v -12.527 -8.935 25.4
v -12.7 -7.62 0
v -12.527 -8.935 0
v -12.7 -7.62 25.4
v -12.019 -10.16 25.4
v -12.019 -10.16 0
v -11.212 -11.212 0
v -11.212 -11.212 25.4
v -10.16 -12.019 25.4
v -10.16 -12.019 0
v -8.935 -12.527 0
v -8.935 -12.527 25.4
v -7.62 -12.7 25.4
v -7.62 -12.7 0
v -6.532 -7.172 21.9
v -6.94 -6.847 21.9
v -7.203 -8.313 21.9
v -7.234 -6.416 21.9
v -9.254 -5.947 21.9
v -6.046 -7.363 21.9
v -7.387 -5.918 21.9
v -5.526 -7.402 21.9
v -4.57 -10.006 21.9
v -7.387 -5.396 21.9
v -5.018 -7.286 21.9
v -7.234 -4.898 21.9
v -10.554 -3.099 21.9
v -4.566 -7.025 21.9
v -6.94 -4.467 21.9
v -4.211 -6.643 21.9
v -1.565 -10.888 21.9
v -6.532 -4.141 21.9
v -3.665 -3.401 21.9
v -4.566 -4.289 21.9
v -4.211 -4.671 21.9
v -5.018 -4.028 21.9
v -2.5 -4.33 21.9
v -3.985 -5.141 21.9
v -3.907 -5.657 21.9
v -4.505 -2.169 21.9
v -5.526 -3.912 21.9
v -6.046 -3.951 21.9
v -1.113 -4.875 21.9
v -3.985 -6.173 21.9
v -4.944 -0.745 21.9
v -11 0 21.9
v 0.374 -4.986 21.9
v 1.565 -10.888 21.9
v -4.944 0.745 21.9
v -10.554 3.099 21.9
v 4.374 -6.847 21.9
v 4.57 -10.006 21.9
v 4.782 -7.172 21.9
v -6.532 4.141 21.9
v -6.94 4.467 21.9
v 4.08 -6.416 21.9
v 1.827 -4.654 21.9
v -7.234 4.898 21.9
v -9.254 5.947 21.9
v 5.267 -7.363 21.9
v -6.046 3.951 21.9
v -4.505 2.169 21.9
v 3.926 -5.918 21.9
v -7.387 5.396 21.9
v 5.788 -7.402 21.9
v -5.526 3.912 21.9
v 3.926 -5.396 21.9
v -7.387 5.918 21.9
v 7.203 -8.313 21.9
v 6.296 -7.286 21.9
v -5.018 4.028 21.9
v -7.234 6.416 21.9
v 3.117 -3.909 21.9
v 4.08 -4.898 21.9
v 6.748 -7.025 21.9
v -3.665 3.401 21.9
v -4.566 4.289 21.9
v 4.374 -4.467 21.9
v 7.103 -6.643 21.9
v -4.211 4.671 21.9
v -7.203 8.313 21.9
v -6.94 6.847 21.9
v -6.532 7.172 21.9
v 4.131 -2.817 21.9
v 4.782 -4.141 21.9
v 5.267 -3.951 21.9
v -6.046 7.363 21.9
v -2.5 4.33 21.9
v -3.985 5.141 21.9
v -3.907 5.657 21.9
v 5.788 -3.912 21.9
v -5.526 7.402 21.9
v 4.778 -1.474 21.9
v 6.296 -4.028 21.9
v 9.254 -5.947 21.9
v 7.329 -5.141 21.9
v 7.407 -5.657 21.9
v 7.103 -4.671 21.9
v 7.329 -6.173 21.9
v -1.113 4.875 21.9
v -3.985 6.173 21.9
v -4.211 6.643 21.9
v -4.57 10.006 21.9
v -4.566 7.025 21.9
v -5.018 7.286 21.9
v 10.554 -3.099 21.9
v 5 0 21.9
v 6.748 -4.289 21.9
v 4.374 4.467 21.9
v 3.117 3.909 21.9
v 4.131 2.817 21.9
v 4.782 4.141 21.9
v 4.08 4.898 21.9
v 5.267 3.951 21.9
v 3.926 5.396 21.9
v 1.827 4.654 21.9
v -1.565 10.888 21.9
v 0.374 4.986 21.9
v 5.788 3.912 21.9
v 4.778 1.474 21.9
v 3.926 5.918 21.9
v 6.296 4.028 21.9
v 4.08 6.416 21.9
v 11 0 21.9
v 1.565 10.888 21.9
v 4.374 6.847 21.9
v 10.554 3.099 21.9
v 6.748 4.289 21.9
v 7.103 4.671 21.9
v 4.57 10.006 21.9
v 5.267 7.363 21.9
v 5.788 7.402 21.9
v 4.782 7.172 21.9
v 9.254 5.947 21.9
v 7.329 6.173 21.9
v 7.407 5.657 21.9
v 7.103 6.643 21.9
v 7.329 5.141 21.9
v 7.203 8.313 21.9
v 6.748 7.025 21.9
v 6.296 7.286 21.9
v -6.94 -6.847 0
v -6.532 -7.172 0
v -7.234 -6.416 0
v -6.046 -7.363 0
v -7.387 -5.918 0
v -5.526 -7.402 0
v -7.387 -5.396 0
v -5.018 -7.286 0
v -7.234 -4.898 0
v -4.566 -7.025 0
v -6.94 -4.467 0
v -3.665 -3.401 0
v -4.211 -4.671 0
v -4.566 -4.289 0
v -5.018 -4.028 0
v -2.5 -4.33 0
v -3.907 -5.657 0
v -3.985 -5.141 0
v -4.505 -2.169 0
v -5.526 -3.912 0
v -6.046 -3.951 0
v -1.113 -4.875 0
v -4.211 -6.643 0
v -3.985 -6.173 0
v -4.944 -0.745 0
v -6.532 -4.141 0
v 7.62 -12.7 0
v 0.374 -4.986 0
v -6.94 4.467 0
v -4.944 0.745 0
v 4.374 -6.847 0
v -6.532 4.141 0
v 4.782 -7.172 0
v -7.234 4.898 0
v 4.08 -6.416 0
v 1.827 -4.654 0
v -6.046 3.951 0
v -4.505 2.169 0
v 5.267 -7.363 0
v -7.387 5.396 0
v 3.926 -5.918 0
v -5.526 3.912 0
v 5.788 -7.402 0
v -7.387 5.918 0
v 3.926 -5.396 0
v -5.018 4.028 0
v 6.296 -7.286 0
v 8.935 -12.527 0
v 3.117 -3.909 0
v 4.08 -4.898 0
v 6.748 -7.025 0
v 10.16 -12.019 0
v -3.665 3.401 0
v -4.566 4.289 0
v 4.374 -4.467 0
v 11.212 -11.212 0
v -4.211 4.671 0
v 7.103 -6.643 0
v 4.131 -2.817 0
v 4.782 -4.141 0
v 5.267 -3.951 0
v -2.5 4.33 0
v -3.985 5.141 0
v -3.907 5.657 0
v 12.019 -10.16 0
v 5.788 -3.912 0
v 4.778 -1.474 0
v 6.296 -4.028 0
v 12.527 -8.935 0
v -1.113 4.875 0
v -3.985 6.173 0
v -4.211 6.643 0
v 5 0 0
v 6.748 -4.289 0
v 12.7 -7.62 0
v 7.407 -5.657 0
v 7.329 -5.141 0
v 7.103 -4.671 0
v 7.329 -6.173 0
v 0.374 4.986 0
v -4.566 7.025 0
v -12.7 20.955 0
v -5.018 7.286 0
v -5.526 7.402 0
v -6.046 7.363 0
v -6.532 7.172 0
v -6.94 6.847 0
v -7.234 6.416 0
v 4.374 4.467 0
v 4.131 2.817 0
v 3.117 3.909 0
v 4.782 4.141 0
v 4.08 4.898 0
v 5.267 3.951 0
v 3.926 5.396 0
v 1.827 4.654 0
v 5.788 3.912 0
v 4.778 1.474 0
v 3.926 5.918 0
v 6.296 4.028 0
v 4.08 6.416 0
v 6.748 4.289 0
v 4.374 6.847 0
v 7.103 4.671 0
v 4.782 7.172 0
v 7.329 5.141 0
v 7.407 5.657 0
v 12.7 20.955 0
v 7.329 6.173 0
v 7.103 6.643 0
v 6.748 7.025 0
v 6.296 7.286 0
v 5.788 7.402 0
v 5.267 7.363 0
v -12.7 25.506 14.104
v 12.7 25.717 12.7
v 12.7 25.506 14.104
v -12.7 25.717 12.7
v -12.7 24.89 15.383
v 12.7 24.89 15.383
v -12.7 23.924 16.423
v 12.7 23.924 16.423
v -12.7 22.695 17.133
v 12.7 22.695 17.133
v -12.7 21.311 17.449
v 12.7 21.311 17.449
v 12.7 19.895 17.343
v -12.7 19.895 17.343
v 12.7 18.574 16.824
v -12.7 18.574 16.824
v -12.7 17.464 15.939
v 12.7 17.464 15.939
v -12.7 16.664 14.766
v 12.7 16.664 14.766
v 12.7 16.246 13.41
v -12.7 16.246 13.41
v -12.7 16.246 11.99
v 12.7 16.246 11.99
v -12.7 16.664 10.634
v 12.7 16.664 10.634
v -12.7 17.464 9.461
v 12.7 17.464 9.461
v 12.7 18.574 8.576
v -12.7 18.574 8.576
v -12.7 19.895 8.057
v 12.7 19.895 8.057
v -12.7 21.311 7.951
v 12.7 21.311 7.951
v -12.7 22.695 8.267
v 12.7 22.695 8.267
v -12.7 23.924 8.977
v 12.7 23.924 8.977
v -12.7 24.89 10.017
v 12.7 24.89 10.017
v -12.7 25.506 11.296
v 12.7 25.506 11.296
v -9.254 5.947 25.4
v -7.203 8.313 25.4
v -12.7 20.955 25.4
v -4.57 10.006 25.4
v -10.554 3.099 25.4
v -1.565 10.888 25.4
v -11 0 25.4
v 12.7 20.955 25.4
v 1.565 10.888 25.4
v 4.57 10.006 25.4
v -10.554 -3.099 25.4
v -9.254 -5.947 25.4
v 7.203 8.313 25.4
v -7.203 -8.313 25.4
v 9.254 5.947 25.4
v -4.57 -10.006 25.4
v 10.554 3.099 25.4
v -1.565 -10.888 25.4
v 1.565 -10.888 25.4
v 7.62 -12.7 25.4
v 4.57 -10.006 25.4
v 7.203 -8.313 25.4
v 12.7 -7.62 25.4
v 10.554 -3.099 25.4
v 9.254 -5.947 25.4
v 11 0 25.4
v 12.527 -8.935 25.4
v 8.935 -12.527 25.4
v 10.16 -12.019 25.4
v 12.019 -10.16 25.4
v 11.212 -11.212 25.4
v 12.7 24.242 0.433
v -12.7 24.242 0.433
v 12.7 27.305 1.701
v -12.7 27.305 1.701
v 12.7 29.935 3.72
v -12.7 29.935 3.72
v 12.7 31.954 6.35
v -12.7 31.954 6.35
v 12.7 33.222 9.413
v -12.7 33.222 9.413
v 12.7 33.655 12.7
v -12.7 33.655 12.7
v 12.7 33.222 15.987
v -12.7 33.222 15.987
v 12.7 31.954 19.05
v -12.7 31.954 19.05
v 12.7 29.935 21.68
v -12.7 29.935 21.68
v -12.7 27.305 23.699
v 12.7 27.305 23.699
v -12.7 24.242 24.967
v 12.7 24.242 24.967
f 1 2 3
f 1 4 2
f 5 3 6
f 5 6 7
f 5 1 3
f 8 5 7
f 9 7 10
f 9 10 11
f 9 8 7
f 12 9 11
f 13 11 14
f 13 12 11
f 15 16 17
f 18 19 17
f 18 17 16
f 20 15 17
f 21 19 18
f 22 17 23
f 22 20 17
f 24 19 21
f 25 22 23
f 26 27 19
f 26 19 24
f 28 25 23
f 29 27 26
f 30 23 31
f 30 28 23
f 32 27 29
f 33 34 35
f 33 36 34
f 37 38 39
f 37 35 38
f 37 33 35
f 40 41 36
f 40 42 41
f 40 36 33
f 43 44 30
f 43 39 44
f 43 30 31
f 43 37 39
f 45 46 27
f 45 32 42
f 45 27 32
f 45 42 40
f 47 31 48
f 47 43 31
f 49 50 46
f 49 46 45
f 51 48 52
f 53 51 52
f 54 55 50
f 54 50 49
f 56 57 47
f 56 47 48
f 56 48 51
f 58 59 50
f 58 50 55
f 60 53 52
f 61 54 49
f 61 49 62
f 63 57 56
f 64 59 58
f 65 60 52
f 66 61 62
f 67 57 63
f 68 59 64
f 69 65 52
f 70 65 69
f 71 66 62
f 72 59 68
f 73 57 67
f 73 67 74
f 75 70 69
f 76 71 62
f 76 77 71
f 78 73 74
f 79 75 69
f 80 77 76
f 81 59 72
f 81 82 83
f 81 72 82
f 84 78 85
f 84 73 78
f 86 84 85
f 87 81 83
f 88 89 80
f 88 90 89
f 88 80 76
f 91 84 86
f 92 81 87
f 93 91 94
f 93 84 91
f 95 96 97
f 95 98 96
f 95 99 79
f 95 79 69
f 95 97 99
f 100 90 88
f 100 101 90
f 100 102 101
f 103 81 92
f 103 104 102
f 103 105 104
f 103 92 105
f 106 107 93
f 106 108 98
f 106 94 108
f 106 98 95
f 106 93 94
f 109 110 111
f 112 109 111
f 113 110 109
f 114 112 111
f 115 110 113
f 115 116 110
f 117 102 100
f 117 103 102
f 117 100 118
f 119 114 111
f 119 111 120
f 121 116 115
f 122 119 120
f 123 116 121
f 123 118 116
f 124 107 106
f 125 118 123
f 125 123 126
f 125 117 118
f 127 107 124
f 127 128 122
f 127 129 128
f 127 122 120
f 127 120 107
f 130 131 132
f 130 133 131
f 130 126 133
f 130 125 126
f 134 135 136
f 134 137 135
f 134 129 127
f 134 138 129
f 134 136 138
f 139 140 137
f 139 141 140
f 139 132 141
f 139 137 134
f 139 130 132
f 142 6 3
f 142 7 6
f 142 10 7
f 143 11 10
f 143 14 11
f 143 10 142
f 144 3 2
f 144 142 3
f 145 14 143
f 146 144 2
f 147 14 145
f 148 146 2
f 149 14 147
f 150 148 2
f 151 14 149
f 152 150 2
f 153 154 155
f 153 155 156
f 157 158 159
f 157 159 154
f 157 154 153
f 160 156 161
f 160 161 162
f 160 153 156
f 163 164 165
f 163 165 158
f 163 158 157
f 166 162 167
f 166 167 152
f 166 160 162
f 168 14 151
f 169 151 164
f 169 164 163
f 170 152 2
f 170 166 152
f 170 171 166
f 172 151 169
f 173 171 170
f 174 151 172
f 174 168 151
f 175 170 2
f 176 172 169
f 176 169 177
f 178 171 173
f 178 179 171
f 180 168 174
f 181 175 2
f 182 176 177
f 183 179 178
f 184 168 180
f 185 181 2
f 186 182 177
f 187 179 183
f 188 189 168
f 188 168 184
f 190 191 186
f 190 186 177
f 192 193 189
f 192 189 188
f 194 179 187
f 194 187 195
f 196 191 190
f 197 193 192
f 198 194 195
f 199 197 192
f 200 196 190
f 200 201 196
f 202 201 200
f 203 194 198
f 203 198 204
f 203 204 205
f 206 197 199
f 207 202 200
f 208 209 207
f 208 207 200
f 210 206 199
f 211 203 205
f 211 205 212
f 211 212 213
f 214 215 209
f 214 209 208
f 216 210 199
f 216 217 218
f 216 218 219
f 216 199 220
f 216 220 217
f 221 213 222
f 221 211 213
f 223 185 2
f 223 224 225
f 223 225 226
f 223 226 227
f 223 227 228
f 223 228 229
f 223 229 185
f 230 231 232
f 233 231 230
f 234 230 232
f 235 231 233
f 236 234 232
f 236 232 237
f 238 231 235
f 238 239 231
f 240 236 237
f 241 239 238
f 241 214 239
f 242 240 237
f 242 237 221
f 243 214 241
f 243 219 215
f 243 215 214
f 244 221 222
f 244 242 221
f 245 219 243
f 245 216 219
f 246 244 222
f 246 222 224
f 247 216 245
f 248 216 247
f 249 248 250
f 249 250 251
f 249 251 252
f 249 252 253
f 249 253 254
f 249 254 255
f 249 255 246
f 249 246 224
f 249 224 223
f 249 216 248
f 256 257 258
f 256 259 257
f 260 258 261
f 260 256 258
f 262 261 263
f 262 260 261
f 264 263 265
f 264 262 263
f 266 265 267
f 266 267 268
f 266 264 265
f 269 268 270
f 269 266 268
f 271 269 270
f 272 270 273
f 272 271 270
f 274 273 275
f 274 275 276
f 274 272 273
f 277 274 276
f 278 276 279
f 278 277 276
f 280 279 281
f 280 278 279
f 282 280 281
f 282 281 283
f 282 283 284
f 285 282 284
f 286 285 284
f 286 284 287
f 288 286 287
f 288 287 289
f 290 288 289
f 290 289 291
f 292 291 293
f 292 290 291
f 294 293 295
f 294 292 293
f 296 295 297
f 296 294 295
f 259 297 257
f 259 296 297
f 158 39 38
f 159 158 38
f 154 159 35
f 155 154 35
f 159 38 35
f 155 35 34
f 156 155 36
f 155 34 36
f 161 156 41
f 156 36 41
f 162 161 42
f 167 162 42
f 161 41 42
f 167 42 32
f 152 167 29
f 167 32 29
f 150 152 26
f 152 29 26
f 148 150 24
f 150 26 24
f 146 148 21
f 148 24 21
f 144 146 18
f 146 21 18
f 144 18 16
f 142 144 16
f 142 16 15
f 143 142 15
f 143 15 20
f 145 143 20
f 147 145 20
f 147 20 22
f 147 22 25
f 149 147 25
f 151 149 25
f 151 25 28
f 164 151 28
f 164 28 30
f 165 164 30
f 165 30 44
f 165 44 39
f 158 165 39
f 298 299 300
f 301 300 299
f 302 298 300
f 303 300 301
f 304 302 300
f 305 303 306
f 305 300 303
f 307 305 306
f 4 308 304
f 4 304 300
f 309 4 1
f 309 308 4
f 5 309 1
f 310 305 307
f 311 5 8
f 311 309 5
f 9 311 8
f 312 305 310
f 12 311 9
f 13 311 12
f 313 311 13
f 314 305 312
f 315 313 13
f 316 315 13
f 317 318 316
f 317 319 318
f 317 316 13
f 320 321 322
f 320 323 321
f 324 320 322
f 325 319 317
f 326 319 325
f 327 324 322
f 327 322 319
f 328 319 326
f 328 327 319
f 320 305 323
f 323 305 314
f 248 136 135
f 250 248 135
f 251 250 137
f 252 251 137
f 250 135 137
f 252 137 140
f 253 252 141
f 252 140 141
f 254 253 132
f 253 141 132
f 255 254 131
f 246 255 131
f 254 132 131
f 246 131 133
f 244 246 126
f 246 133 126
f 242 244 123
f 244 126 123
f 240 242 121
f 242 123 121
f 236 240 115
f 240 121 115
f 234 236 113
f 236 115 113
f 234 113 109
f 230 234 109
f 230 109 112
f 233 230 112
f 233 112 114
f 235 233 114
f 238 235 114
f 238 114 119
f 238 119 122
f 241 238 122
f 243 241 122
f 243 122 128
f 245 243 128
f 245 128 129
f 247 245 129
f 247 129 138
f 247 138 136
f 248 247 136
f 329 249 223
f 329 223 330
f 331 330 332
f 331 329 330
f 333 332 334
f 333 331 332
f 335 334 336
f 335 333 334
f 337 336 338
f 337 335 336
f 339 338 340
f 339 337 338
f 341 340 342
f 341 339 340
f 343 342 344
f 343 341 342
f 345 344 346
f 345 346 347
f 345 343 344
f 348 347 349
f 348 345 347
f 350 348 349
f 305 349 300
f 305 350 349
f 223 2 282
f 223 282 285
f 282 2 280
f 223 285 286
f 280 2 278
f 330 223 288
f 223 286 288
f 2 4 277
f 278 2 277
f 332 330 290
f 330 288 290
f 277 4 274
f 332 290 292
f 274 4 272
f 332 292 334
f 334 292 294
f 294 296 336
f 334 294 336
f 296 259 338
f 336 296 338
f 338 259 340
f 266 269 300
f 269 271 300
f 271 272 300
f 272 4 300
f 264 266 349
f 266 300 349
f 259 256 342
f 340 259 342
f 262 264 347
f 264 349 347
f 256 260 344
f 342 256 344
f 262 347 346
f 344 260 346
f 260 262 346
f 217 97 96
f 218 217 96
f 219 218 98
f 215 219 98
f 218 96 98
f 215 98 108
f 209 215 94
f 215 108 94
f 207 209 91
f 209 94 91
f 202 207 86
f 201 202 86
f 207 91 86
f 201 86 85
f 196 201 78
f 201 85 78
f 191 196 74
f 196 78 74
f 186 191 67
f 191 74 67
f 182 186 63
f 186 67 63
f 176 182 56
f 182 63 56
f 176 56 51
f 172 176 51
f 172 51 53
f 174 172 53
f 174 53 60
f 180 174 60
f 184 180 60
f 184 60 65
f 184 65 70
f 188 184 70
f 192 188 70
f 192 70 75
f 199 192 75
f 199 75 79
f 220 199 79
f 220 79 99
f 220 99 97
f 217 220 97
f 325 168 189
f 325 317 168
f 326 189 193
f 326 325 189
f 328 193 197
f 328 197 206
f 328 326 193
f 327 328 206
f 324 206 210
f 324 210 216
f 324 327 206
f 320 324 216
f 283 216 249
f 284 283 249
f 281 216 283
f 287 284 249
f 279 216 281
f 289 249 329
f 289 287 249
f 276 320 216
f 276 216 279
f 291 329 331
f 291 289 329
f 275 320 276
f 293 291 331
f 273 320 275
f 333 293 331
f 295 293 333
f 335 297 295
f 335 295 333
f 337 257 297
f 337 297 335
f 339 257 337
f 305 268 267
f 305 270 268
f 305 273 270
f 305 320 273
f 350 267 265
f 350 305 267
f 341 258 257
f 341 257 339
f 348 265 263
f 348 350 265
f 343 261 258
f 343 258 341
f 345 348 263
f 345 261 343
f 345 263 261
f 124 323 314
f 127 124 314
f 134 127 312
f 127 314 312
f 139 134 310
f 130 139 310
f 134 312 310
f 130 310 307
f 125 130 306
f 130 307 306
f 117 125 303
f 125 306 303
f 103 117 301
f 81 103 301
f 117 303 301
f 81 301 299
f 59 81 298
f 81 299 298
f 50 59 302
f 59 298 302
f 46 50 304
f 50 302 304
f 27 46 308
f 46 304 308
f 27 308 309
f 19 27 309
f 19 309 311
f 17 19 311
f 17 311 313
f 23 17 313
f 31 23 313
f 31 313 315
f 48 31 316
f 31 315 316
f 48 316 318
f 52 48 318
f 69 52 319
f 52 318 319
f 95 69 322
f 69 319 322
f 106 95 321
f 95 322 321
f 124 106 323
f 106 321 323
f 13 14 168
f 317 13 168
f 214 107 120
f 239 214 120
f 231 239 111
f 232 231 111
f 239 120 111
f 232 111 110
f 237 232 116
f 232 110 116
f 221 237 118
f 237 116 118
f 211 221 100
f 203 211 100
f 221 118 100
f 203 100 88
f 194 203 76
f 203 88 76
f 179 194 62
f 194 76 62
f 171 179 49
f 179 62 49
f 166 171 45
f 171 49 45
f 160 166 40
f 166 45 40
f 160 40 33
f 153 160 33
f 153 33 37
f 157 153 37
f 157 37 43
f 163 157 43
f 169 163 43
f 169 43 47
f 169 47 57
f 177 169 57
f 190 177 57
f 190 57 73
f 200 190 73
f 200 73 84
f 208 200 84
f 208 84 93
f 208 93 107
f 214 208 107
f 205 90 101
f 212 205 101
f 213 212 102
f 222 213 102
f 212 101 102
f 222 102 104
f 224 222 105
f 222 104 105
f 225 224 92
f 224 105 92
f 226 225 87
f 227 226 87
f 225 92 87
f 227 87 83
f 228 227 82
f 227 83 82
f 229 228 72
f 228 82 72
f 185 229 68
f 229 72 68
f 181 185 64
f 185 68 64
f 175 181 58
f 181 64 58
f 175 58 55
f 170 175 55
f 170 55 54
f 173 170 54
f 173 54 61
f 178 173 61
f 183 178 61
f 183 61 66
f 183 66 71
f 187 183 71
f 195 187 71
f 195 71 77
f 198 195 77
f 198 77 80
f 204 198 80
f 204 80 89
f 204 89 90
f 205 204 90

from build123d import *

# Parameters (mm, degrees)
F0_W          = 25.4
F0_H          = 25.4
F1_DEPTH      = 25.4
F2_R          = 4.7625
F3_DEPTH      = 12.7
F3_DEPTH_BACK = 12.7
F4_R          = 5.08
F5_R          = 5
F5_R_2        = 1.75
F6_DEPTH      = 25.401
F7_R          = 11
F8_DEPTH      = 3.5


with BuildPart() as f1:
    # F0 (on Top) → F1 (new body)
    with BuildSketch(Plane.XY):
        Rectangle(F0_W, F0_H)
    extrude(amount=F1_DEPTH)

    # F2 (on Right) → F3 (join, two sides)
    with BuildSketch(Plane.YZ) as f3_sk:
        with BuildLine():
            Line((12.7, 0), (20.955, 0))
            ThreePointArc((20.955, 0), (33.655, 12.7), (20.955, 25.4))
            Line((20.955, 25.4), (12.7, 25.4))
            Line((12.7, 25.4), (12.7, 0))
        make_face()
        with Locations((20.955, 12.7)):
            Circle(F2_R, mode=Mode.SUBTRACT)
    extrude(amount=F3_DEPTH)
    extrude(f3_sk.sketch, amount=-F3_DEPTH_BACK)

    # F4
    f4_edges = [f1.edges().sort_by_distance(p)[0] for p in [
        (12.7, -12.7, 12.7),
        (-12.7, -12.7, 12.7),
    ]]
    fillet(f4_edges, radius=F4_R)

    # F5 (on face) → F6 (cut, through all)
    with BuildSketch(Plane.XY.offset(25.4)):
        Circle(F5_R)
        with Locations((-5.6568542495, 5.6568542495)):
            Circle(F5_R_2)
        with Locations((5.6568542495, 5.6568542495)):
            Circle(F5_R_2)
        with BuildLine():
            ThreePointArc((3.9068542495, -5.6568542495), (5.6568542495, -7.4068542495), (7.4068542495, -5.6568542495))
            ThreePointArc((7.4068542495, -5.6568542495), (5.6568542495, -3.9068542495), (3.9068542495, -5.6568542495))
        make_face()
        with Locations((-5.6568542495, -5.6568542495)):
            Circle(F5_R_2)
    extrude(amount=-F6_DEPTH, mode=Mode.SUBTRACT)

    # F7 (on face) → F8 (cut)
    with BuildSketch(Plane.XY.offset(25.4)):
        Circle(F7_R)
    extrude(amount=-F8_DEPTH, mode=Mode.SUBTRACT)


solid = f1.part
